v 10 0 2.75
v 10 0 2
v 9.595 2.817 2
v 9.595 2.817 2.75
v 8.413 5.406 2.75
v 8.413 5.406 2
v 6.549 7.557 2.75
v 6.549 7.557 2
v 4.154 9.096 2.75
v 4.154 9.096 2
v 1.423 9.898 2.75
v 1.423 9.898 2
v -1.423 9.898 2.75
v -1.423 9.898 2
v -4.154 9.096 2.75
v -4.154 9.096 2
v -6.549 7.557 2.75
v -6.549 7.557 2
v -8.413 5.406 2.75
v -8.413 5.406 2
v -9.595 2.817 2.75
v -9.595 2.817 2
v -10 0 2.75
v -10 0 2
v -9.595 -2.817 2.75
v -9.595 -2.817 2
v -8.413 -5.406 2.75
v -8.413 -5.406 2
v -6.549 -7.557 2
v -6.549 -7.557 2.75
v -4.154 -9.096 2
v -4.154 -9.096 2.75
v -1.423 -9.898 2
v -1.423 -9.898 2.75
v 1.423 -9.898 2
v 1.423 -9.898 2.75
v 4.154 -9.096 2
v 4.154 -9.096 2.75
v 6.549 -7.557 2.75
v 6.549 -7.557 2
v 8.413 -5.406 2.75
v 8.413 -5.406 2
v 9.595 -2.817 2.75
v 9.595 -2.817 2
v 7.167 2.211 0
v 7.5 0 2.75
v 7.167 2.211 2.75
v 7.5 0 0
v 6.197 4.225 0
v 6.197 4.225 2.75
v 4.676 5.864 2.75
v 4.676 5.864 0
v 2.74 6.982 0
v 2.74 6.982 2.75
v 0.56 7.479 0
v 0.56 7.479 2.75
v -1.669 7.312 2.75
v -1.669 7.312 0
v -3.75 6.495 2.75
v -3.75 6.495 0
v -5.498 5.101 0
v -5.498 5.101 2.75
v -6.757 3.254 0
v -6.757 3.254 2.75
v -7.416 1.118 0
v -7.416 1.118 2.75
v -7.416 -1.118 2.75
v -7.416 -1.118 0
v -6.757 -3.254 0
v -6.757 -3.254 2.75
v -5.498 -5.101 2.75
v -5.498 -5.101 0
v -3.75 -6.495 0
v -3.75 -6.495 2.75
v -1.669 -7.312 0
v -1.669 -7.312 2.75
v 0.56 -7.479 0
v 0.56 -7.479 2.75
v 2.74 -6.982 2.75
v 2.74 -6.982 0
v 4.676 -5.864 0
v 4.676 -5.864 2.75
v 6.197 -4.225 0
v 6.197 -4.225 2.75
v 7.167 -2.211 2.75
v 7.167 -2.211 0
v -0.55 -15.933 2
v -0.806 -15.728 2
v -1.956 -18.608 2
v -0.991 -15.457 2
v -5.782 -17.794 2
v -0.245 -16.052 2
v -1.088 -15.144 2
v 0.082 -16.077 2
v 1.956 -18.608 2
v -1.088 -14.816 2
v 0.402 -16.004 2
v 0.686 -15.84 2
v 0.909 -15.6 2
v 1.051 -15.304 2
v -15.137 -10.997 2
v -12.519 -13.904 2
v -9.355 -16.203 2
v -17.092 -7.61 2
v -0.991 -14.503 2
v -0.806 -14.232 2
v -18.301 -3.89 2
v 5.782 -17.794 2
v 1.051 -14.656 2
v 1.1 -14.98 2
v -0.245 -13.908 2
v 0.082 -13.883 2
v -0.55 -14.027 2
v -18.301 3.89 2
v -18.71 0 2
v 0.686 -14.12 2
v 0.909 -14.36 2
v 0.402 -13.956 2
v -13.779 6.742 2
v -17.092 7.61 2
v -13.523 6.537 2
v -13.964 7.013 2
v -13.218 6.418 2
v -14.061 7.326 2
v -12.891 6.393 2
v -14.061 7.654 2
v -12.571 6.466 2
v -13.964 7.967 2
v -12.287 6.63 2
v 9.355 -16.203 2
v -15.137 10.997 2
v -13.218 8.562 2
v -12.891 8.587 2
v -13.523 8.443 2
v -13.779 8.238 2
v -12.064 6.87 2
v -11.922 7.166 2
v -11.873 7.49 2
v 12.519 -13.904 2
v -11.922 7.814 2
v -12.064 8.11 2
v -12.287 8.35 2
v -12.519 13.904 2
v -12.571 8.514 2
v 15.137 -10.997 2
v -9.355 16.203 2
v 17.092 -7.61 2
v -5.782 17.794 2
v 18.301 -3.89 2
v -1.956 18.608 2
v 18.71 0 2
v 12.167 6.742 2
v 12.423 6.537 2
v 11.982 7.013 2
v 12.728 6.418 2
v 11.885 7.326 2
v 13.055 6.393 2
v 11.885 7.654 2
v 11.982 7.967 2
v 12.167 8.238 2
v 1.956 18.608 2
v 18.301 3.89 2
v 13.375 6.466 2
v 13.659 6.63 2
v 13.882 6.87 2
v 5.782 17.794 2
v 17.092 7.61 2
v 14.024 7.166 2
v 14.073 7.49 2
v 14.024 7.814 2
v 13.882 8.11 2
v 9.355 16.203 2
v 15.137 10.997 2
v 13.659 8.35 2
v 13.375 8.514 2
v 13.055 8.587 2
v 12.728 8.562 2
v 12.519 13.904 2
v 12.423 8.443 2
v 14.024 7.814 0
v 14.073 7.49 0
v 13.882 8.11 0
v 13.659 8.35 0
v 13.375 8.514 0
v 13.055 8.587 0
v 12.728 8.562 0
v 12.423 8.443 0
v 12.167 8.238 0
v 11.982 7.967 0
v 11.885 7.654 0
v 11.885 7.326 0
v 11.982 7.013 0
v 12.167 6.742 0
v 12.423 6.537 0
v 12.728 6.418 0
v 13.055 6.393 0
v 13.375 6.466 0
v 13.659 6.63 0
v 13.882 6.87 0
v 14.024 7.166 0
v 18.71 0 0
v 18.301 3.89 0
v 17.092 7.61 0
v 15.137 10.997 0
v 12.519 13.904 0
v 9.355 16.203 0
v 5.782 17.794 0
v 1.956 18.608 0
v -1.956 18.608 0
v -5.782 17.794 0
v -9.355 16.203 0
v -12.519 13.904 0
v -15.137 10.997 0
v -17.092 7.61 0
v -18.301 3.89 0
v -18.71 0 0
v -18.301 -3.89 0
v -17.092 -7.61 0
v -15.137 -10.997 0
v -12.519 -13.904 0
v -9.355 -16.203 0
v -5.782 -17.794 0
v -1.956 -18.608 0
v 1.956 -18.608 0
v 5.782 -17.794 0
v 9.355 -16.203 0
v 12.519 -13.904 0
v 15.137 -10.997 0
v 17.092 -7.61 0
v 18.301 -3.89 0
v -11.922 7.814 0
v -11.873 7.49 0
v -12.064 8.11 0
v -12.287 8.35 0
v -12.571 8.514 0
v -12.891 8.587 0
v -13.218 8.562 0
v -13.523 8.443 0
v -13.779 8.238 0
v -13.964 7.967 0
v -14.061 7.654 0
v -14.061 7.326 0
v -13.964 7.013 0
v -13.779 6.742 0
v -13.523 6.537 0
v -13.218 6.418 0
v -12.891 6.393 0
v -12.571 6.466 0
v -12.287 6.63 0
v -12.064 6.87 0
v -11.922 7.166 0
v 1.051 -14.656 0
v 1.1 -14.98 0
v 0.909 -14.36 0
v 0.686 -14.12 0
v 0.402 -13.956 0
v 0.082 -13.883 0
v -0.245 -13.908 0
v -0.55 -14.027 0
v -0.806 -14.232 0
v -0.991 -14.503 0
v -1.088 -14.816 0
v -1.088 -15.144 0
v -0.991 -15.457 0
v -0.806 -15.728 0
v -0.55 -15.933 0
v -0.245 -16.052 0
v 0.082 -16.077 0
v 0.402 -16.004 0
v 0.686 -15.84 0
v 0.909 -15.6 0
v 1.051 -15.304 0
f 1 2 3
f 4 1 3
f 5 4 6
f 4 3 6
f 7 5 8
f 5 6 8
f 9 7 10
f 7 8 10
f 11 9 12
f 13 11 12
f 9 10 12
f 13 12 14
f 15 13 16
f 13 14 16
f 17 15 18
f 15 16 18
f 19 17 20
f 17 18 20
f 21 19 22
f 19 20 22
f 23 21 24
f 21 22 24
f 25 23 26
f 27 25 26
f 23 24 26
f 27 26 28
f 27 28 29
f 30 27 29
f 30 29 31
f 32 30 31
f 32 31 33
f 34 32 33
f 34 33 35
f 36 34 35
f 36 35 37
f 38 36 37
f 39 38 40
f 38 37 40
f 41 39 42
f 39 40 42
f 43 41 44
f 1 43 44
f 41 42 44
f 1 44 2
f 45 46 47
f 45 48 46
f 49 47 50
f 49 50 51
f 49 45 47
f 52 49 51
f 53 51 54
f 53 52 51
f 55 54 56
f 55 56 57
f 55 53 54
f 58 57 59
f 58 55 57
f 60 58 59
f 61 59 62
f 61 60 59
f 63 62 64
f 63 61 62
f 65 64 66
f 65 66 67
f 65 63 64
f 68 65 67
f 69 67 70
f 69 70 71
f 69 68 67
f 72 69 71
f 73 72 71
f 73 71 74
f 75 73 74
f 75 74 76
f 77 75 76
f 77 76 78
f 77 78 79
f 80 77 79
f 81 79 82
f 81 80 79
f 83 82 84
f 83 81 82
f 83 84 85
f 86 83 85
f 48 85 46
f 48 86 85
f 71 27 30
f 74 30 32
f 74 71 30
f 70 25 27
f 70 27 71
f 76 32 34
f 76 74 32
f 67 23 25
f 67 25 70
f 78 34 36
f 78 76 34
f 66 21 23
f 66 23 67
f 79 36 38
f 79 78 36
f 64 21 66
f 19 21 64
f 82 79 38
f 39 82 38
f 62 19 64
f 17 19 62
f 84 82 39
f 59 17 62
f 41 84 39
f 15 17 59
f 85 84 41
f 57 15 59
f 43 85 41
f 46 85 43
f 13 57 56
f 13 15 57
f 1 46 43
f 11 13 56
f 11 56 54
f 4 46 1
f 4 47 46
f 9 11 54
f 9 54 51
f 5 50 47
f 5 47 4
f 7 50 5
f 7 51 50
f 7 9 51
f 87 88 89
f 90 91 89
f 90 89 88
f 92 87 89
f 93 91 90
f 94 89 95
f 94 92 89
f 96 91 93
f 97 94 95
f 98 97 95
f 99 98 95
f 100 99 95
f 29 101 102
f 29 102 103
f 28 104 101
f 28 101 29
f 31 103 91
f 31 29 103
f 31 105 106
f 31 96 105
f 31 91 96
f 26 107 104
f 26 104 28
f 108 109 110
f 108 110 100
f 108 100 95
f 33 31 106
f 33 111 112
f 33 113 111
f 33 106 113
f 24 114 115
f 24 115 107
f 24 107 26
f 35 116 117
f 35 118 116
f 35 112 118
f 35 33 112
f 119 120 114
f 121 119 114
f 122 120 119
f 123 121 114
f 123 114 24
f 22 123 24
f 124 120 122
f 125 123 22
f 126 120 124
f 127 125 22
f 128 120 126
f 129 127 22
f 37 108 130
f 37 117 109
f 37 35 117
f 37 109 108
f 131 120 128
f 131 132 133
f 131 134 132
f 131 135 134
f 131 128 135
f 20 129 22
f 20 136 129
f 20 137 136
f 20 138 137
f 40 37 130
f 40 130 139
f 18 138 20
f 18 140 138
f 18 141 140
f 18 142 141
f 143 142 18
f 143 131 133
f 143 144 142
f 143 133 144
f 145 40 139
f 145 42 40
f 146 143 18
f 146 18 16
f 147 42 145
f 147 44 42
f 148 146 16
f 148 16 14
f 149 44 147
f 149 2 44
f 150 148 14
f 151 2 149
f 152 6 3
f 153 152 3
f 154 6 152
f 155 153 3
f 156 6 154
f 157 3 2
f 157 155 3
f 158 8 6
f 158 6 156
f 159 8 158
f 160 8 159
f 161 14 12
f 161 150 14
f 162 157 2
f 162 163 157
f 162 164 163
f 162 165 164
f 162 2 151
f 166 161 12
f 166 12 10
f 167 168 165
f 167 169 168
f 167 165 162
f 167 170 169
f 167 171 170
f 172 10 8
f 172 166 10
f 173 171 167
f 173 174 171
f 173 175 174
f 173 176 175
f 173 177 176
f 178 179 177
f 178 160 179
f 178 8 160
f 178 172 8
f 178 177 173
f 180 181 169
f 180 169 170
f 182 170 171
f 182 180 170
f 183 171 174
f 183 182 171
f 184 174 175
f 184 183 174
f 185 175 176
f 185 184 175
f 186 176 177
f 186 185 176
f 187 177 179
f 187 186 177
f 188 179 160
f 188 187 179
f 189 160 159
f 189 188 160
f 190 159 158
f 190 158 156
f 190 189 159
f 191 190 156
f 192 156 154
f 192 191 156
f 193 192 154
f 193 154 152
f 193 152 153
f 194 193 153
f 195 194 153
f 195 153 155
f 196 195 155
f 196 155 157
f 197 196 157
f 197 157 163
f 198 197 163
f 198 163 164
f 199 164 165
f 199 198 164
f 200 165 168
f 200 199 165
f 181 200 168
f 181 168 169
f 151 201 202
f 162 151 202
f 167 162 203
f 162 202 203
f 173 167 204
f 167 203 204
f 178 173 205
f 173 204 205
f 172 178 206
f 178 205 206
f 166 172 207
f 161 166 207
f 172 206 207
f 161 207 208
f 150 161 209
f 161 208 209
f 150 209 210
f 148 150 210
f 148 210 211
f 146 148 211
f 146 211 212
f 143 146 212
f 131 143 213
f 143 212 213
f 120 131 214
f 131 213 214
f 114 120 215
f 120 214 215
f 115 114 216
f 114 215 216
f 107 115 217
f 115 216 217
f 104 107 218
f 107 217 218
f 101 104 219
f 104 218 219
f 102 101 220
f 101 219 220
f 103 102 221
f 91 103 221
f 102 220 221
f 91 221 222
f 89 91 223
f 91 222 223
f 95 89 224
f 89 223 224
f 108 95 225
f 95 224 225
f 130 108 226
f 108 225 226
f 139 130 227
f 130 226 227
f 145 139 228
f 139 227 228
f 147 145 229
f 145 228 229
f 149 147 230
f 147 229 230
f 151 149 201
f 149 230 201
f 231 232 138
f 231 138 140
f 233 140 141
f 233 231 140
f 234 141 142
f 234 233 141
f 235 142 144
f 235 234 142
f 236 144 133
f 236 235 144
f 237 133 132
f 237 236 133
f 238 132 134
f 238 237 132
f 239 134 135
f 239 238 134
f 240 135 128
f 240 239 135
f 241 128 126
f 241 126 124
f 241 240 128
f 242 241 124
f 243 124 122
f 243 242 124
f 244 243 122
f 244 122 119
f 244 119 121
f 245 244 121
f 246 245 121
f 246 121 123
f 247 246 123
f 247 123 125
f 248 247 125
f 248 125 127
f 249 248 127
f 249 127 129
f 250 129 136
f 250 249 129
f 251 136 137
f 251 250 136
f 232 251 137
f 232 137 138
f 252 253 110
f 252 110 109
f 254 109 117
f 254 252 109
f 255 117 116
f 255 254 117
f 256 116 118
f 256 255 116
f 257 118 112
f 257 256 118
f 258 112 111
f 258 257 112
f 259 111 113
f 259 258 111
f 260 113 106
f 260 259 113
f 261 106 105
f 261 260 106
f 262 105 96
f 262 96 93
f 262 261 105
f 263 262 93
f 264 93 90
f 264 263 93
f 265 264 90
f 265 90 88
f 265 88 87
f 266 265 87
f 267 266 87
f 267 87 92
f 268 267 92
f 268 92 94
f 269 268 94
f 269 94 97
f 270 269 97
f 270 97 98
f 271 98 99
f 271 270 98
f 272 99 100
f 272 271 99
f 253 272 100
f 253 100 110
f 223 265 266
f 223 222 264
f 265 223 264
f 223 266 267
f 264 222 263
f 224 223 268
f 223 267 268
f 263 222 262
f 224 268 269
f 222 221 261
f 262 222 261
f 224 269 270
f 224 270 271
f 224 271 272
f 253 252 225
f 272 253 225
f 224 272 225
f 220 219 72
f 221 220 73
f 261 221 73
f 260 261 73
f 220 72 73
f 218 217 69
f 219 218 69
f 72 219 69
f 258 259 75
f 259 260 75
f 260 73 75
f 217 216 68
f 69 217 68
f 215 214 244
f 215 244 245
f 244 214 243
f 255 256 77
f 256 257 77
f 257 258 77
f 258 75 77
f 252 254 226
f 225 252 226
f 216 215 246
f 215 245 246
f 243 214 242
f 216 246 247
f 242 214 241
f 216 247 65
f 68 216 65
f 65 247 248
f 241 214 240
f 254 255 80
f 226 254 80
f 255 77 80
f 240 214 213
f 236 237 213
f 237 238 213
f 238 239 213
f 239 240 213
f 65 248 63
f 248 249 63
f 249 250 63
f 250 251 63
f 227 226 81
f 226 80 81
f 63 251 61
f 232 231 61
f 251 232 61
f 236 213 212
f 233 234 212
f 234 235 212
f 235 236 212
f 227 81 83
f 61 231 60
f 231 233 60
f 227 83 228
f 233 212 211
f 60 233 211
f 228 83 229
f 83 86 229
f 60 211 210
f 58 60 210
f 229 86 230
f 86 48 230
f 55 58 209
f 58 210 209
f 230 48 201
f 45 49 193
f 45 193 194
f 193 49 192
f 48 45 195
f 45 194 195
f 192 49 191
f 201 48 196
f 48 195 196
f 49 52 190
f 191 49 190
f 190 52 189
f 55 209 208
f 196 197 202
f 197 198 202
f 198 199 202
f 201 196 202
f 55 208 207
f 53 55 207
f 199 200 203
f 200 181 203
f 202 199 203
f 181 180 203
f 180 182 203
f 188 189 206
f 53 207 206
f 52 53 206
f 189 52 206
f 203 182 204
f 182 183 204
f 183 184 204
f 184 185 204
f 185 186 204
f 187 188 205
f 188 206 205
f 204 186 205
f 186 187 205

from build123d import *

# Parameters (mm, degrees)
SKETCH1_R           = 18.71
SKETCH1_R_2         = 1.1
SKETCH1_R_3         = 7.5
BOSS_EXTRUDE1_DEPTH = 2
SKETCH2_R           = 10
SKETCH2_R_2         = 7.5
BOSS_EXTRUDE2_DEPTH = 0.75


with BuildPart() as part:
    # Sketch1 → Boss-Extrude1 (new body)
    with BuildSketch(Plane.XY):
        Circle(SKETCH1_R)
        with Locations((0, -14.98)):
            Circle(SKETCH1_R_2, mode=Mode.SUBTRACT)
        with Locations((-12.973060549, 7.49)):
            Circle(SKETCH1_R_2, mode=Mode.SUBTRACT)
        with Locations((12.973060549, 7.49)):
            Circle(SKETCH1_R_2, mode=Mode.SUBTRACT)
        Circle(SKETCH1_R_3, mode=Mode.SUBTRACT)
    extrude(amount=BOSS_EXTRUDE1_DEPTH)

    # Sketch2 → Boss-Extrude2 (add)
    with BuildSketch(Plane.XY.offset(2)):
        Circle(SKETCH2_R)
        Circle(SKETCH2_R_2, mode=Mode.SUBTRACT)
    extrude(amount=BOSS_EXTRUDE2_DEPTH)


solid = part.part
